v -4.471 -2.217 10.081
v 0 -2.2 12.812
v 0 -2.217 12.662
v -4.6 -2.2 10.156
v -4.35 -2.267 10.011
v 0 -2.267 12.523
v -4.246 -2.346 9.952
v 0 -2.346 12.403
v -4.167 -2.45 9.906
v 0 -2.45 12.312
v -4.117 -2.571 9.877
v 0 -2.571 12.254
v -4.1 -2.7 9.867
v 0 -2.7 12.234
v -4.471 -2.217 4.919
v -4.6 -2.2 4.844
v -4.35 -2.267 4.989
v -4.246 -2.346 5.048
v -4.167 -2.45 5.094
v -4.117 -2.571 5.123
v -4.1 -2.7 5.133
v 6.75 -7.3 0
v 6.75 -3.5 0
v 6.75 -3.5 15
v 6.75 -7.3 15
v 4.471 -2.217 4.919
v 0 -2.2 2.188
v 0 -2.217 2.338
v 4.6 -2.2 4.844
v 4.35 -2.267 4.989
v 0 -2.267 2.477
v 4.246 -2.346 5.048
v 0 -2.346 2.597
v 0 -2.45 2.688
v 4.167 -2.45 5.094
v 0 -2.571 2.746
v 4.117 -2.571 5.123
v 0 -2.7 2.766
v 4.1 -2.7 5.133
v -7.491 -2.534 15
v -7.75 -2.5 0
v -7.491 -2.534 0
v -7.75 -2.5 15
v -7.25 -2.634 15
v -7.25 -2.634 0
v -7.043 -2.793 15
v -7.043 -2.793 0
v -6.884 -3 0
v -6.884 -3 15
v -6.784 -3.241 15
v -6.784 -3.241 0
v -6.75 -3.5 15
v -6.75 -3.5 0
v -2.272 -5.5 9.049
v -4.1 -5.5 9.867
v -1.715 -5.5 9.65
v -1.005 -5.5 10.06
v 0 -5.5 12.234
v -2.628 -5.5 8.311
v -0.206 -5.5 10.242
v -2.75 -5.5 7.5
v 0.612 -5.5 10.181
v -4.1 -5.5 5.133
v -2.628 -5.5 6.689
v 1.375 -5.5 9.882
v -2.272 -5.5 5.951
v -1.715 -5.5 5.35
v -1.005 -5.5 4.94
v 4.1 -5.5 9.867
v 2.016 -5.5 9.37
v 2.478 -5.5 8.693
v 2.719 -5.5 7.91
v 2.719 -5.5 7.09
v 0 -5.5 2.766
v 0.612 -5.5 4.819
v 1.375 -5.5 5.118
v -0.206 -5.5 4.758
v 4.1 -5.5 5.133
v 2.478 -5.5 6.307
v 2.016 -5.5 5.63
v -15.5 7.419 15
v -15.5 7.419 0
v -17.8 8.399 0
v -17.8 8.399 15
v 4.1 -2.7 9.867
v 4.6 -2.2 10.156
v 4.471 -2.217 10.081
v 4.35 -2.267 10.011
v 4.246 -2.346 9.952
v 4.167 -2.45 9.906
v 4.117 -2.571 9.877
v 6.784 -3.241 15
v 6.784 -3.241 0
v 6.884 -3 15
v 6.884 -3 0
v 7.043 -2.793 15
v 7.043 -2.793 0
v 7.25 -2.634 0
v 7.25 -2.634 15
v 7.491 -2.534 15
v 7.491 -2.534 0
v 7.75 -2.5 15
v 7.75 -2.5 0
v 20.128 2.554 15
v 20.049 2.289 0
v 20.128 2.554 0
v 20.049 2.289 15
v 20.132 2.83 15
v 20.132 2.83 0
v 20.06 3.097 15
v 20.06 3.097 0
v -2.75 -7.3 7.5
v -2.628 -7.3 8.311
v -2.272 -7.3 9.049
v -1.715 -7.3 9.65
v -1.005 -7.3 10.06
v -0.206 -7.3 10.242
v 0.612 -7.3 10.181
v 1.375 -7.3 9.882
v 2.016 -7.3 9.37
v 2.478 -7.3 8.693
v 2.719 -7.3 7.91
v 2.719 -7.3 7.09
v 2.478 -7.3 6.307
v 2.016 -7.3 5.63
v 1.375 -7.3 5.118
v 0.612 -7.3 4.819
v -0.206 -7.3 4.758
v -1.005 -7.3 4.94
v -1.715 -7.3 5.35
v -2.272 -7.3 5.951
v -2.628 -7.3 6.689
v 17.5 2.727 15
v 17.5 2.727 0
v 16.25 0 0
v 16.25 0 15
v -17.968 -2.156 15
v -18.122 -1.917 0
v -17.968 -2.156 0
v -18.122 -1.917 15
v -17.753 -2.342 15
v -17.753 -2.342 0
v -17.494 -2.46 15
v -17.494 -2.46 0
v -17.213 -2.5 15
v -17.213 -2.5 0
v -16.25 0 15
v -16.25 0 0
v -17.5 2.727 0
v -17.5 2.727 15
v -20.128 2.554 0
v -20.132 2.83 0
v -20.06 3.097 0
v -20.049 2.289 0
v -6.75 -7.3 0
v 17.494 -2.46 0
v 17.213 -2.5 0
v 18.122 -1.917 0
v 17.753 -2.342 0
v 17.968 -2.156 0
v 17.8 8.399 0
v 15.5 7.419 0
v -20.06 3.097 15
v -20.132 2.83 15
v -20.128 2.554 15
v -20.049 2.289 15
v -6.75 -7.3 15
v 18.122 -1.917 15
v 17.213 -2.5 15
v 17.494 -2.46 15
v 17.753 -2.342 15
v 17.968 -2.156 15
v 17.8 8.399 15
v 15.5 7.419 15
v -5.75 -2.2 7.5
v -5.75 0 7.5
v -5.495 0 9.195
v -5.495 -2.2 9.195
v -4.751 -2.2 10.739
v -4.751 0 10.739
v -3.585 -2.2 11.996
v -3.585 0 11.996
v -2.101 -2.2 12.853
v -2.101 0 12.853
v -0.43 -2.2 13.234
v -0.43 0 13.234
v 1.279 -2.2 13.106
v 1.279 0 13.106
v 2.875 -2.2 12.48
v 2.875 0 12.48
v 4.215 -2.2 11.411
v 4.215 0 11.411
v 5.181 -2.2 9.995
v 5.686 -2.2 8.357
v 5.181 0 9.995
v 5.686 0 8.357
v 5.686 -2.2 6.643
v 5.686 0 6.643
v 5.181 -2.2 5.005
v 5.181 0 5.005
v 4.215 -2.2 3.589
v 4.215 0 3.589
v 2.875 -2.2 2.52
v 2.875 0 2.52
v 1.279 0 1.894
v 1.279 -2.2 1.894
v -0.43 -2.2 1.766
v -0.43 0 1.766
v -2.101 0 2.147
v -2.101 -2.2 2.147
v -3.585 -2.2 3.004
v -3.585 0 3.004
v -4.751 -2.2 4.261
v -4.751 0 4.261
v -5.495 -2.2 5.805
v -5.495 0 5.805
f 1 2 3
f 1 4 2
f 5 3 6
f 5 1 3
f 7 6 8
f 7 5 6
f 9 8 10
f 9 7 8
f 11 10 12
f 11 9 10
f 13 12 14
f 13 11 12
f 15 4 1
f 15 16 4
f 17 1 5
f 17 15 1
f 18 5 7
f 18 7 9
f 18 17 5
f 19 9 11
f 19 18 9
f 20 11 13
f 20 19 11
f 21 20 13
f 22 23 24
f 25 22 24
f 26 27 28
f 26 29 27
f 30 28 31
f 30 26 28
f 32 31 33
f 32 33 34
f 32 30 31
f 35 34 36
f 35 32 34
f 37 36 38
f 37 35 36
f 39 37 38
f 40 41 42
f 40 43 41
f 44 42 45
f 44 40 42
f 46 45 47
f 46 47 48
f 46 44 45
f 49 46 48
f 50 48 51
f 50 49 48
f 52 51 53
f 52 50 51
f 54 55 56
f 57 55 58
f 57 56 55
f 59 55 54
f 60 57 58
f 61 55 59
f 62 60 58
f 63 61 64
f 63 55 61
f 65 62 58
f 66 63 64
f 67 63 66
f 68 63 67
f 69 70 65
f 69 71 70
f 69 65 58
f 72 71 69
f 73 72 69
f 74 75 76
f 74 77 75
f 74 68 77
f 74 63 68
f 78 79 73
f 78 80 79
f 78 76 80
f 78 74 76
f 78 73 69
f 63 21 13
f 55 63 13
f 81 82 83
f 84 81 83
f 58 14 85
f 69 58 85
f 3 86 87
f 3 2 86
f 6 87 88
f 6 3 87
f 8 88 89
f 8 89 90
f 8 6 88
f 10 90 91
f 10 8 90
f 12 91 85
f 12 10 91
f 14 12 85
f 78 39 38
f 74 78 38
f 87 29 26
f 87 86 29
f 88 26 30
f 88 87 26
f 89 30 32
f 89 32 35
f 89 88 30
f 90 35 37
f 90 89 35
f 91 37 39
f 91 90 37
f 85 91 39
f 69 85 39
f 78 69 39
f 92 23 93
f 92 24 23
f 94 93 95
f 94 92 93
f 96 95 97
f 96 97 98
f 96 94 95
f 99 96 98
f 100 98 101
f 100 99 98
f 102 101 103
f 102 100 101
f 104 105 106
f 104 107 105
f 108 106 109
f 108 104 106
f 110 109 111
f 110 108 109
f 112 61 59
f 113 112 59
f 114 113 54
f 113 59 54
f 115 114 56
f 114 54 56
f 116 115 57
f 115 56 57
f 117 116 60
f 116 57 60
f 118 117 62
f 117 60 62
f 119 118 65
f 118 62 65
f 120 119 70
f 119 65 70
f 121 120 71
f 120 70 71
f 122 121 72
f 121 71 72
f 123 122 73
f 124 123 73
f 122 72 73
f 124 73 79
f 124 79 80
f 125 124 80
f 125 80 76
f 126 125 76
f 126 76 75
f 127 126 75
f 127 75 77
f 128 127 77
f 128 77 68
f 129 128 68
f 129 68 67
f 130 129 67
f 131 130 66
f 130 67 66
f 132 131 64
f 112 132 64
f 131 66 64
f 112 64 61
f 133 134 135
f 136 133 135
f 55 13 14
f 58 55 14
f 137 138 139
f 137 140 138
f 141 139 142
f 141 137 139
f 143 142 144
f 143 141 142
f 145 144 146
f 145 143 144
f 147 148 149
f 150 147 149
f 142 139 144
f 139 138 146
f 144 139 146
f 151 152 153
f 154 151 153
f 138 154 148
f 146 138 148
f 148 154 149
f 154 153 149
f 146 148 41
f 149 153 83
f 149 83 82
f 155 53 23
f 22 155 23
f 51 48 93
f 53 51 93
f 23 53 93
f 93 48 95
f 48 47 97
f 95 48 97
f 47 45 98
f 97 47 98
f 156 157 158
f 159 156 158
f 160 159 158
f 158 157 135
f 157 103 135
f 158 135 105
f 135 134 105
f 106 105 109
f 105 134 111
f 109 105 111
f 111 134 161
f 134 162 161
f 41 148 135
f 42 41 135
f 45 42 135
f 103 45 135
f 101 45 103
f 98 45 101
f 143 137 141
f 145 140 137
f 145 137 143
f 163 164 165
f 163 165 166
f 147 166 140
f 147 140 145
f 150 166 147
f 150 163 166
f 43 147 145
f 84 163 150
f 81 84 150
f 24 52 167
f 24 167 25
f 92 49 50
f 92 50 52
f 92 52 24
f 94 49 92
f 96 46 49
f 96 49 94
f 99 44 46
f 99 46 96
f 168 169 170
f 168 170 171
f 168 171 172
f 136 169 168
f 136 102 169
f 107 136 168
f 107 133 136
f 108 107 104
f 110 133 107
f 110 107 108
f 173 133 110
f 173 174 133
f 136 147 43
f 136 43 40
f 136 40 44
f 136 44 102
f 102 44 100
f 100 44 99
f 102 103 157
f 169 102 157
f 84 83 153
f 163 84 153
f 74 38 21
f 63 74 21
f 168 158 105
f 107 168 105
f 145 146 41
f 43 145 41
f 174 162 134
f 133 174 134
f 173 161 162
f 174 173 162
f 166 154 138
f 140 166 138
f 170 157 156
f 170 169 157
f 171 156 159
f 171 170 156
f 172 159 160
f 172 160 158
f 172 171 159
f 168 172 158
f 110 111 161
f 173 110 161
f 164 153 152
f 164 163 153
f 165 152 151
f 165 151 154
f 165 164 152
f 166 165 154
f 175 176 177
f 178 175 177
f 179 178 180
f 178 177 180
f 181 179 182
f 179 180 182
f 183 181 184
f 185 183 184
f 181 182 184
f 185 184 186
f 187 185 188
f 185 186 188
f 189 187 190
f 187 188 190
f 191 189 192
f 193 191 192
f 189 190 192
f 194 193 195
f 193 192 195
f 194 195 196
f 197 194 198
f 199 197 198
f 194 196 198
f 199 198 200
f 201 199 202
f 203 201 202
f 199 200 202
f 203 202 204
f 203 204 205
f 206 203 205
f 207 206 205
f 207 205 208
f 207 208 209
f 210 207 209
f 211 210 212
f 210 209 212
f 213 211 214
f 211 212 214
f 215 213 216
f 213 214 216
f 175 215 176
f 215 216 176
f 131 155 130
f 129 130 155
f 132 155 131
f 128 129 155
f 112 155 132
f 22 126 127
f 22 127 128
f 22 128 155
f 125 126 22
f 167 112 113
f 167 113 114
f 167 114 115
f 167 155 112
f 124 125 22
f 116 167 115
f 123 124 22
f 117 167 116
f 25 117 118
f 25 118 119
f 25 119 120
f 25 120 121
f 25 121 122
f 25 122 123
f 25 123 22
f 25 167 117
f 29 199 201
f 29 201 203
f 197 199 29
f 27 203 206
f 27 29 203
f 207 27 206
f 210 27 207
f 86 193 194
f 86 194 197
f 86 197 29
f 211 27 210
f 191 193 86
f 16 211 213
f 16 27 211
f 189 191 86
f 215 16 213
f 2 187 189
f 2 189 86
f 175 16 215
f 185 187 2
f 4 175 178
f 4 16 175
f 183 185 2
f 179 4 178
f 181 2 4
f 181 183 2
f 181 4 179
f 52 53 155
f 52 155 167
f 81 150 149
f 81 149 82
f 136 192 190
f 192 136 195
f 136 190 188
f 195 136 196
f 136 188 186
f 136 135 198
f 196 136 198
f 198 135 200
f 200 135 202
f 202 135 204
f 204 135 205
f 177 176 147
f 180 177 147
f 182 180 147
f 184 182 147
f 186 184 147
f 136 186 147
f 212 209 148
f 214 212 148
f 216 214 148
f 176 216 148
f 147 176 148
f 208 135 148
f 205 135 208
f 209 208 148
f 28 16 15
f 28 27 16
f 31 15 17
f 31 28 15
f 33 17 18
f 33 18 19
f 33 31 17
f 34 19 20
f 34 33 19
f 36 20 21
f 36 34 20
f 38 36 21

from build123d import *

# Parameters (mm, degrees)
BOSS_EXTRUDE1_DEPTH = 15
SKETCH4_W           = 13.5
SKETCH4_H           = 15
BOSS_EXTRUDE2_DEPTH = 4.8
CUT_EXTRUDE1_DEPTH  = 5.5
SKETCH6_R           = 5.75
CUT_EXTRUDE2_DEPTH  = 2.2
SKETCH7_R           = 2.75
CUT_EXTRUDE3_DEPTH  = 1.8
FILLET1_R           = 1
FILLET2_R           = 0.5


with BuildPart() as part:
    # Sketch1 → Boss-Extrude1 (new body)
    with BuildSketch(Plane.XY):
        Polygon((0, -2.5), (0, 0), (-16.25, 0), (-17.5, 2.727178029), (-15.5, 7.418659671), (-17.799745903, 8.399051828), (-20.233306637, 2.690549074), (-17.85422237, -2.5), align=None)
        Polygon((17.5, 2.727178029), (16.25, 0), (0, 0), (0, -2.5), (17.85422237, -2.5), (20.233306637, 2.690549074), (17.799745903, 8.399051828), (15.5, 7.418659671), align=None)
    extrude(amount=BOSS_EXTRUDE1_DEPTH)

    # Sketch4 → Boss-Extrude2 (add)
    with BuildSketch(Plane.XZ.offset(2.5)):
        with Locations((0, 7.5)):
            Rectangle(SKETCH4_W, SKETCH4_H)
    extrude(amount=BOSS_EXTRUDE2_DEPTH)

    # Sketch5 → Cut-Extrude1 (cut)
    with BuildSketch(Plane(origin=(0, 0, 0), x_dir=(1, 0, 0), z_dir=(0, 1, 0))):
        Polygon((-4.1, -9.867136104), (0, -12.234272207), (4.1, -9.867136104), (4.1, -5.132863896), (0, -2.765727793), (-4.1, -5.132863896), align=None)
    extrude(amount=-CUT_EXTRUDE1_DEPTH, mode=Mode.SUBTRACT)

    # Sketch6 → Cut-Extrude2 (cut)
    with BuildSketch(Plane(origin=(0, 0, 0), x_dir=(1, 0, 0), z_dir=(0, 1, 0))):
        with Locations(Location((0, -7.5, 0), (0, 0, 180))):
            Circle(SKETCH6_R)
    extrude(amount=-CUT_EXTRUDE2_DEPTH, mode=Mode.SUBTRACT)

    # Sketch7 → Cut-Extrude3 (cut)
    with BuildSketch(Plane(origin=(0, -5.5, 0), x_dir=(1, 0, 0), z_dir=(0, 1, 0))):
        with Locations(Location((0, -7.5, 0), (0, 0, 180))):
            Circle(SKETCH7_R)
    extrude(amount=-CUT_EXTRUDE3_DEPTH, mode=Mode.SUBTRACT)

    # Fillet1
    fillet1_edges = [part.edges().sort_by_distance(p)[0] for p in [
        (-17.85422237, -2.5, 7.5),
        (-20.233306637, 2.690549074, 7.5),
        (20.233306637, 2.690549074, 7.5),
        (17.85422237, -2.5, 7.5),
        (-6.75, -2.5, 7.5),
        (6.75, -2.5, 7.5),
    ]]
    fillet(fillet1_edges, radius=FILLET1_R)

    # Fillet2
    fillet2_edges = [part.edges().sort_by_distance(p)[0] for p in [
        (-2.05, -2.2, 11.050704156),
        (-4.1, -2.2, 7.5),
        (-2.05, -2.2, 3.949295844),
        (2.05, -2.2, 3.949295844),
        (4.1, -2.2, 7.5),
        (2.05, -2.2, 11.050704156),
    ]]
    fillet(fillet2_edges, radius=FILLET2_R)


solid = part.part
